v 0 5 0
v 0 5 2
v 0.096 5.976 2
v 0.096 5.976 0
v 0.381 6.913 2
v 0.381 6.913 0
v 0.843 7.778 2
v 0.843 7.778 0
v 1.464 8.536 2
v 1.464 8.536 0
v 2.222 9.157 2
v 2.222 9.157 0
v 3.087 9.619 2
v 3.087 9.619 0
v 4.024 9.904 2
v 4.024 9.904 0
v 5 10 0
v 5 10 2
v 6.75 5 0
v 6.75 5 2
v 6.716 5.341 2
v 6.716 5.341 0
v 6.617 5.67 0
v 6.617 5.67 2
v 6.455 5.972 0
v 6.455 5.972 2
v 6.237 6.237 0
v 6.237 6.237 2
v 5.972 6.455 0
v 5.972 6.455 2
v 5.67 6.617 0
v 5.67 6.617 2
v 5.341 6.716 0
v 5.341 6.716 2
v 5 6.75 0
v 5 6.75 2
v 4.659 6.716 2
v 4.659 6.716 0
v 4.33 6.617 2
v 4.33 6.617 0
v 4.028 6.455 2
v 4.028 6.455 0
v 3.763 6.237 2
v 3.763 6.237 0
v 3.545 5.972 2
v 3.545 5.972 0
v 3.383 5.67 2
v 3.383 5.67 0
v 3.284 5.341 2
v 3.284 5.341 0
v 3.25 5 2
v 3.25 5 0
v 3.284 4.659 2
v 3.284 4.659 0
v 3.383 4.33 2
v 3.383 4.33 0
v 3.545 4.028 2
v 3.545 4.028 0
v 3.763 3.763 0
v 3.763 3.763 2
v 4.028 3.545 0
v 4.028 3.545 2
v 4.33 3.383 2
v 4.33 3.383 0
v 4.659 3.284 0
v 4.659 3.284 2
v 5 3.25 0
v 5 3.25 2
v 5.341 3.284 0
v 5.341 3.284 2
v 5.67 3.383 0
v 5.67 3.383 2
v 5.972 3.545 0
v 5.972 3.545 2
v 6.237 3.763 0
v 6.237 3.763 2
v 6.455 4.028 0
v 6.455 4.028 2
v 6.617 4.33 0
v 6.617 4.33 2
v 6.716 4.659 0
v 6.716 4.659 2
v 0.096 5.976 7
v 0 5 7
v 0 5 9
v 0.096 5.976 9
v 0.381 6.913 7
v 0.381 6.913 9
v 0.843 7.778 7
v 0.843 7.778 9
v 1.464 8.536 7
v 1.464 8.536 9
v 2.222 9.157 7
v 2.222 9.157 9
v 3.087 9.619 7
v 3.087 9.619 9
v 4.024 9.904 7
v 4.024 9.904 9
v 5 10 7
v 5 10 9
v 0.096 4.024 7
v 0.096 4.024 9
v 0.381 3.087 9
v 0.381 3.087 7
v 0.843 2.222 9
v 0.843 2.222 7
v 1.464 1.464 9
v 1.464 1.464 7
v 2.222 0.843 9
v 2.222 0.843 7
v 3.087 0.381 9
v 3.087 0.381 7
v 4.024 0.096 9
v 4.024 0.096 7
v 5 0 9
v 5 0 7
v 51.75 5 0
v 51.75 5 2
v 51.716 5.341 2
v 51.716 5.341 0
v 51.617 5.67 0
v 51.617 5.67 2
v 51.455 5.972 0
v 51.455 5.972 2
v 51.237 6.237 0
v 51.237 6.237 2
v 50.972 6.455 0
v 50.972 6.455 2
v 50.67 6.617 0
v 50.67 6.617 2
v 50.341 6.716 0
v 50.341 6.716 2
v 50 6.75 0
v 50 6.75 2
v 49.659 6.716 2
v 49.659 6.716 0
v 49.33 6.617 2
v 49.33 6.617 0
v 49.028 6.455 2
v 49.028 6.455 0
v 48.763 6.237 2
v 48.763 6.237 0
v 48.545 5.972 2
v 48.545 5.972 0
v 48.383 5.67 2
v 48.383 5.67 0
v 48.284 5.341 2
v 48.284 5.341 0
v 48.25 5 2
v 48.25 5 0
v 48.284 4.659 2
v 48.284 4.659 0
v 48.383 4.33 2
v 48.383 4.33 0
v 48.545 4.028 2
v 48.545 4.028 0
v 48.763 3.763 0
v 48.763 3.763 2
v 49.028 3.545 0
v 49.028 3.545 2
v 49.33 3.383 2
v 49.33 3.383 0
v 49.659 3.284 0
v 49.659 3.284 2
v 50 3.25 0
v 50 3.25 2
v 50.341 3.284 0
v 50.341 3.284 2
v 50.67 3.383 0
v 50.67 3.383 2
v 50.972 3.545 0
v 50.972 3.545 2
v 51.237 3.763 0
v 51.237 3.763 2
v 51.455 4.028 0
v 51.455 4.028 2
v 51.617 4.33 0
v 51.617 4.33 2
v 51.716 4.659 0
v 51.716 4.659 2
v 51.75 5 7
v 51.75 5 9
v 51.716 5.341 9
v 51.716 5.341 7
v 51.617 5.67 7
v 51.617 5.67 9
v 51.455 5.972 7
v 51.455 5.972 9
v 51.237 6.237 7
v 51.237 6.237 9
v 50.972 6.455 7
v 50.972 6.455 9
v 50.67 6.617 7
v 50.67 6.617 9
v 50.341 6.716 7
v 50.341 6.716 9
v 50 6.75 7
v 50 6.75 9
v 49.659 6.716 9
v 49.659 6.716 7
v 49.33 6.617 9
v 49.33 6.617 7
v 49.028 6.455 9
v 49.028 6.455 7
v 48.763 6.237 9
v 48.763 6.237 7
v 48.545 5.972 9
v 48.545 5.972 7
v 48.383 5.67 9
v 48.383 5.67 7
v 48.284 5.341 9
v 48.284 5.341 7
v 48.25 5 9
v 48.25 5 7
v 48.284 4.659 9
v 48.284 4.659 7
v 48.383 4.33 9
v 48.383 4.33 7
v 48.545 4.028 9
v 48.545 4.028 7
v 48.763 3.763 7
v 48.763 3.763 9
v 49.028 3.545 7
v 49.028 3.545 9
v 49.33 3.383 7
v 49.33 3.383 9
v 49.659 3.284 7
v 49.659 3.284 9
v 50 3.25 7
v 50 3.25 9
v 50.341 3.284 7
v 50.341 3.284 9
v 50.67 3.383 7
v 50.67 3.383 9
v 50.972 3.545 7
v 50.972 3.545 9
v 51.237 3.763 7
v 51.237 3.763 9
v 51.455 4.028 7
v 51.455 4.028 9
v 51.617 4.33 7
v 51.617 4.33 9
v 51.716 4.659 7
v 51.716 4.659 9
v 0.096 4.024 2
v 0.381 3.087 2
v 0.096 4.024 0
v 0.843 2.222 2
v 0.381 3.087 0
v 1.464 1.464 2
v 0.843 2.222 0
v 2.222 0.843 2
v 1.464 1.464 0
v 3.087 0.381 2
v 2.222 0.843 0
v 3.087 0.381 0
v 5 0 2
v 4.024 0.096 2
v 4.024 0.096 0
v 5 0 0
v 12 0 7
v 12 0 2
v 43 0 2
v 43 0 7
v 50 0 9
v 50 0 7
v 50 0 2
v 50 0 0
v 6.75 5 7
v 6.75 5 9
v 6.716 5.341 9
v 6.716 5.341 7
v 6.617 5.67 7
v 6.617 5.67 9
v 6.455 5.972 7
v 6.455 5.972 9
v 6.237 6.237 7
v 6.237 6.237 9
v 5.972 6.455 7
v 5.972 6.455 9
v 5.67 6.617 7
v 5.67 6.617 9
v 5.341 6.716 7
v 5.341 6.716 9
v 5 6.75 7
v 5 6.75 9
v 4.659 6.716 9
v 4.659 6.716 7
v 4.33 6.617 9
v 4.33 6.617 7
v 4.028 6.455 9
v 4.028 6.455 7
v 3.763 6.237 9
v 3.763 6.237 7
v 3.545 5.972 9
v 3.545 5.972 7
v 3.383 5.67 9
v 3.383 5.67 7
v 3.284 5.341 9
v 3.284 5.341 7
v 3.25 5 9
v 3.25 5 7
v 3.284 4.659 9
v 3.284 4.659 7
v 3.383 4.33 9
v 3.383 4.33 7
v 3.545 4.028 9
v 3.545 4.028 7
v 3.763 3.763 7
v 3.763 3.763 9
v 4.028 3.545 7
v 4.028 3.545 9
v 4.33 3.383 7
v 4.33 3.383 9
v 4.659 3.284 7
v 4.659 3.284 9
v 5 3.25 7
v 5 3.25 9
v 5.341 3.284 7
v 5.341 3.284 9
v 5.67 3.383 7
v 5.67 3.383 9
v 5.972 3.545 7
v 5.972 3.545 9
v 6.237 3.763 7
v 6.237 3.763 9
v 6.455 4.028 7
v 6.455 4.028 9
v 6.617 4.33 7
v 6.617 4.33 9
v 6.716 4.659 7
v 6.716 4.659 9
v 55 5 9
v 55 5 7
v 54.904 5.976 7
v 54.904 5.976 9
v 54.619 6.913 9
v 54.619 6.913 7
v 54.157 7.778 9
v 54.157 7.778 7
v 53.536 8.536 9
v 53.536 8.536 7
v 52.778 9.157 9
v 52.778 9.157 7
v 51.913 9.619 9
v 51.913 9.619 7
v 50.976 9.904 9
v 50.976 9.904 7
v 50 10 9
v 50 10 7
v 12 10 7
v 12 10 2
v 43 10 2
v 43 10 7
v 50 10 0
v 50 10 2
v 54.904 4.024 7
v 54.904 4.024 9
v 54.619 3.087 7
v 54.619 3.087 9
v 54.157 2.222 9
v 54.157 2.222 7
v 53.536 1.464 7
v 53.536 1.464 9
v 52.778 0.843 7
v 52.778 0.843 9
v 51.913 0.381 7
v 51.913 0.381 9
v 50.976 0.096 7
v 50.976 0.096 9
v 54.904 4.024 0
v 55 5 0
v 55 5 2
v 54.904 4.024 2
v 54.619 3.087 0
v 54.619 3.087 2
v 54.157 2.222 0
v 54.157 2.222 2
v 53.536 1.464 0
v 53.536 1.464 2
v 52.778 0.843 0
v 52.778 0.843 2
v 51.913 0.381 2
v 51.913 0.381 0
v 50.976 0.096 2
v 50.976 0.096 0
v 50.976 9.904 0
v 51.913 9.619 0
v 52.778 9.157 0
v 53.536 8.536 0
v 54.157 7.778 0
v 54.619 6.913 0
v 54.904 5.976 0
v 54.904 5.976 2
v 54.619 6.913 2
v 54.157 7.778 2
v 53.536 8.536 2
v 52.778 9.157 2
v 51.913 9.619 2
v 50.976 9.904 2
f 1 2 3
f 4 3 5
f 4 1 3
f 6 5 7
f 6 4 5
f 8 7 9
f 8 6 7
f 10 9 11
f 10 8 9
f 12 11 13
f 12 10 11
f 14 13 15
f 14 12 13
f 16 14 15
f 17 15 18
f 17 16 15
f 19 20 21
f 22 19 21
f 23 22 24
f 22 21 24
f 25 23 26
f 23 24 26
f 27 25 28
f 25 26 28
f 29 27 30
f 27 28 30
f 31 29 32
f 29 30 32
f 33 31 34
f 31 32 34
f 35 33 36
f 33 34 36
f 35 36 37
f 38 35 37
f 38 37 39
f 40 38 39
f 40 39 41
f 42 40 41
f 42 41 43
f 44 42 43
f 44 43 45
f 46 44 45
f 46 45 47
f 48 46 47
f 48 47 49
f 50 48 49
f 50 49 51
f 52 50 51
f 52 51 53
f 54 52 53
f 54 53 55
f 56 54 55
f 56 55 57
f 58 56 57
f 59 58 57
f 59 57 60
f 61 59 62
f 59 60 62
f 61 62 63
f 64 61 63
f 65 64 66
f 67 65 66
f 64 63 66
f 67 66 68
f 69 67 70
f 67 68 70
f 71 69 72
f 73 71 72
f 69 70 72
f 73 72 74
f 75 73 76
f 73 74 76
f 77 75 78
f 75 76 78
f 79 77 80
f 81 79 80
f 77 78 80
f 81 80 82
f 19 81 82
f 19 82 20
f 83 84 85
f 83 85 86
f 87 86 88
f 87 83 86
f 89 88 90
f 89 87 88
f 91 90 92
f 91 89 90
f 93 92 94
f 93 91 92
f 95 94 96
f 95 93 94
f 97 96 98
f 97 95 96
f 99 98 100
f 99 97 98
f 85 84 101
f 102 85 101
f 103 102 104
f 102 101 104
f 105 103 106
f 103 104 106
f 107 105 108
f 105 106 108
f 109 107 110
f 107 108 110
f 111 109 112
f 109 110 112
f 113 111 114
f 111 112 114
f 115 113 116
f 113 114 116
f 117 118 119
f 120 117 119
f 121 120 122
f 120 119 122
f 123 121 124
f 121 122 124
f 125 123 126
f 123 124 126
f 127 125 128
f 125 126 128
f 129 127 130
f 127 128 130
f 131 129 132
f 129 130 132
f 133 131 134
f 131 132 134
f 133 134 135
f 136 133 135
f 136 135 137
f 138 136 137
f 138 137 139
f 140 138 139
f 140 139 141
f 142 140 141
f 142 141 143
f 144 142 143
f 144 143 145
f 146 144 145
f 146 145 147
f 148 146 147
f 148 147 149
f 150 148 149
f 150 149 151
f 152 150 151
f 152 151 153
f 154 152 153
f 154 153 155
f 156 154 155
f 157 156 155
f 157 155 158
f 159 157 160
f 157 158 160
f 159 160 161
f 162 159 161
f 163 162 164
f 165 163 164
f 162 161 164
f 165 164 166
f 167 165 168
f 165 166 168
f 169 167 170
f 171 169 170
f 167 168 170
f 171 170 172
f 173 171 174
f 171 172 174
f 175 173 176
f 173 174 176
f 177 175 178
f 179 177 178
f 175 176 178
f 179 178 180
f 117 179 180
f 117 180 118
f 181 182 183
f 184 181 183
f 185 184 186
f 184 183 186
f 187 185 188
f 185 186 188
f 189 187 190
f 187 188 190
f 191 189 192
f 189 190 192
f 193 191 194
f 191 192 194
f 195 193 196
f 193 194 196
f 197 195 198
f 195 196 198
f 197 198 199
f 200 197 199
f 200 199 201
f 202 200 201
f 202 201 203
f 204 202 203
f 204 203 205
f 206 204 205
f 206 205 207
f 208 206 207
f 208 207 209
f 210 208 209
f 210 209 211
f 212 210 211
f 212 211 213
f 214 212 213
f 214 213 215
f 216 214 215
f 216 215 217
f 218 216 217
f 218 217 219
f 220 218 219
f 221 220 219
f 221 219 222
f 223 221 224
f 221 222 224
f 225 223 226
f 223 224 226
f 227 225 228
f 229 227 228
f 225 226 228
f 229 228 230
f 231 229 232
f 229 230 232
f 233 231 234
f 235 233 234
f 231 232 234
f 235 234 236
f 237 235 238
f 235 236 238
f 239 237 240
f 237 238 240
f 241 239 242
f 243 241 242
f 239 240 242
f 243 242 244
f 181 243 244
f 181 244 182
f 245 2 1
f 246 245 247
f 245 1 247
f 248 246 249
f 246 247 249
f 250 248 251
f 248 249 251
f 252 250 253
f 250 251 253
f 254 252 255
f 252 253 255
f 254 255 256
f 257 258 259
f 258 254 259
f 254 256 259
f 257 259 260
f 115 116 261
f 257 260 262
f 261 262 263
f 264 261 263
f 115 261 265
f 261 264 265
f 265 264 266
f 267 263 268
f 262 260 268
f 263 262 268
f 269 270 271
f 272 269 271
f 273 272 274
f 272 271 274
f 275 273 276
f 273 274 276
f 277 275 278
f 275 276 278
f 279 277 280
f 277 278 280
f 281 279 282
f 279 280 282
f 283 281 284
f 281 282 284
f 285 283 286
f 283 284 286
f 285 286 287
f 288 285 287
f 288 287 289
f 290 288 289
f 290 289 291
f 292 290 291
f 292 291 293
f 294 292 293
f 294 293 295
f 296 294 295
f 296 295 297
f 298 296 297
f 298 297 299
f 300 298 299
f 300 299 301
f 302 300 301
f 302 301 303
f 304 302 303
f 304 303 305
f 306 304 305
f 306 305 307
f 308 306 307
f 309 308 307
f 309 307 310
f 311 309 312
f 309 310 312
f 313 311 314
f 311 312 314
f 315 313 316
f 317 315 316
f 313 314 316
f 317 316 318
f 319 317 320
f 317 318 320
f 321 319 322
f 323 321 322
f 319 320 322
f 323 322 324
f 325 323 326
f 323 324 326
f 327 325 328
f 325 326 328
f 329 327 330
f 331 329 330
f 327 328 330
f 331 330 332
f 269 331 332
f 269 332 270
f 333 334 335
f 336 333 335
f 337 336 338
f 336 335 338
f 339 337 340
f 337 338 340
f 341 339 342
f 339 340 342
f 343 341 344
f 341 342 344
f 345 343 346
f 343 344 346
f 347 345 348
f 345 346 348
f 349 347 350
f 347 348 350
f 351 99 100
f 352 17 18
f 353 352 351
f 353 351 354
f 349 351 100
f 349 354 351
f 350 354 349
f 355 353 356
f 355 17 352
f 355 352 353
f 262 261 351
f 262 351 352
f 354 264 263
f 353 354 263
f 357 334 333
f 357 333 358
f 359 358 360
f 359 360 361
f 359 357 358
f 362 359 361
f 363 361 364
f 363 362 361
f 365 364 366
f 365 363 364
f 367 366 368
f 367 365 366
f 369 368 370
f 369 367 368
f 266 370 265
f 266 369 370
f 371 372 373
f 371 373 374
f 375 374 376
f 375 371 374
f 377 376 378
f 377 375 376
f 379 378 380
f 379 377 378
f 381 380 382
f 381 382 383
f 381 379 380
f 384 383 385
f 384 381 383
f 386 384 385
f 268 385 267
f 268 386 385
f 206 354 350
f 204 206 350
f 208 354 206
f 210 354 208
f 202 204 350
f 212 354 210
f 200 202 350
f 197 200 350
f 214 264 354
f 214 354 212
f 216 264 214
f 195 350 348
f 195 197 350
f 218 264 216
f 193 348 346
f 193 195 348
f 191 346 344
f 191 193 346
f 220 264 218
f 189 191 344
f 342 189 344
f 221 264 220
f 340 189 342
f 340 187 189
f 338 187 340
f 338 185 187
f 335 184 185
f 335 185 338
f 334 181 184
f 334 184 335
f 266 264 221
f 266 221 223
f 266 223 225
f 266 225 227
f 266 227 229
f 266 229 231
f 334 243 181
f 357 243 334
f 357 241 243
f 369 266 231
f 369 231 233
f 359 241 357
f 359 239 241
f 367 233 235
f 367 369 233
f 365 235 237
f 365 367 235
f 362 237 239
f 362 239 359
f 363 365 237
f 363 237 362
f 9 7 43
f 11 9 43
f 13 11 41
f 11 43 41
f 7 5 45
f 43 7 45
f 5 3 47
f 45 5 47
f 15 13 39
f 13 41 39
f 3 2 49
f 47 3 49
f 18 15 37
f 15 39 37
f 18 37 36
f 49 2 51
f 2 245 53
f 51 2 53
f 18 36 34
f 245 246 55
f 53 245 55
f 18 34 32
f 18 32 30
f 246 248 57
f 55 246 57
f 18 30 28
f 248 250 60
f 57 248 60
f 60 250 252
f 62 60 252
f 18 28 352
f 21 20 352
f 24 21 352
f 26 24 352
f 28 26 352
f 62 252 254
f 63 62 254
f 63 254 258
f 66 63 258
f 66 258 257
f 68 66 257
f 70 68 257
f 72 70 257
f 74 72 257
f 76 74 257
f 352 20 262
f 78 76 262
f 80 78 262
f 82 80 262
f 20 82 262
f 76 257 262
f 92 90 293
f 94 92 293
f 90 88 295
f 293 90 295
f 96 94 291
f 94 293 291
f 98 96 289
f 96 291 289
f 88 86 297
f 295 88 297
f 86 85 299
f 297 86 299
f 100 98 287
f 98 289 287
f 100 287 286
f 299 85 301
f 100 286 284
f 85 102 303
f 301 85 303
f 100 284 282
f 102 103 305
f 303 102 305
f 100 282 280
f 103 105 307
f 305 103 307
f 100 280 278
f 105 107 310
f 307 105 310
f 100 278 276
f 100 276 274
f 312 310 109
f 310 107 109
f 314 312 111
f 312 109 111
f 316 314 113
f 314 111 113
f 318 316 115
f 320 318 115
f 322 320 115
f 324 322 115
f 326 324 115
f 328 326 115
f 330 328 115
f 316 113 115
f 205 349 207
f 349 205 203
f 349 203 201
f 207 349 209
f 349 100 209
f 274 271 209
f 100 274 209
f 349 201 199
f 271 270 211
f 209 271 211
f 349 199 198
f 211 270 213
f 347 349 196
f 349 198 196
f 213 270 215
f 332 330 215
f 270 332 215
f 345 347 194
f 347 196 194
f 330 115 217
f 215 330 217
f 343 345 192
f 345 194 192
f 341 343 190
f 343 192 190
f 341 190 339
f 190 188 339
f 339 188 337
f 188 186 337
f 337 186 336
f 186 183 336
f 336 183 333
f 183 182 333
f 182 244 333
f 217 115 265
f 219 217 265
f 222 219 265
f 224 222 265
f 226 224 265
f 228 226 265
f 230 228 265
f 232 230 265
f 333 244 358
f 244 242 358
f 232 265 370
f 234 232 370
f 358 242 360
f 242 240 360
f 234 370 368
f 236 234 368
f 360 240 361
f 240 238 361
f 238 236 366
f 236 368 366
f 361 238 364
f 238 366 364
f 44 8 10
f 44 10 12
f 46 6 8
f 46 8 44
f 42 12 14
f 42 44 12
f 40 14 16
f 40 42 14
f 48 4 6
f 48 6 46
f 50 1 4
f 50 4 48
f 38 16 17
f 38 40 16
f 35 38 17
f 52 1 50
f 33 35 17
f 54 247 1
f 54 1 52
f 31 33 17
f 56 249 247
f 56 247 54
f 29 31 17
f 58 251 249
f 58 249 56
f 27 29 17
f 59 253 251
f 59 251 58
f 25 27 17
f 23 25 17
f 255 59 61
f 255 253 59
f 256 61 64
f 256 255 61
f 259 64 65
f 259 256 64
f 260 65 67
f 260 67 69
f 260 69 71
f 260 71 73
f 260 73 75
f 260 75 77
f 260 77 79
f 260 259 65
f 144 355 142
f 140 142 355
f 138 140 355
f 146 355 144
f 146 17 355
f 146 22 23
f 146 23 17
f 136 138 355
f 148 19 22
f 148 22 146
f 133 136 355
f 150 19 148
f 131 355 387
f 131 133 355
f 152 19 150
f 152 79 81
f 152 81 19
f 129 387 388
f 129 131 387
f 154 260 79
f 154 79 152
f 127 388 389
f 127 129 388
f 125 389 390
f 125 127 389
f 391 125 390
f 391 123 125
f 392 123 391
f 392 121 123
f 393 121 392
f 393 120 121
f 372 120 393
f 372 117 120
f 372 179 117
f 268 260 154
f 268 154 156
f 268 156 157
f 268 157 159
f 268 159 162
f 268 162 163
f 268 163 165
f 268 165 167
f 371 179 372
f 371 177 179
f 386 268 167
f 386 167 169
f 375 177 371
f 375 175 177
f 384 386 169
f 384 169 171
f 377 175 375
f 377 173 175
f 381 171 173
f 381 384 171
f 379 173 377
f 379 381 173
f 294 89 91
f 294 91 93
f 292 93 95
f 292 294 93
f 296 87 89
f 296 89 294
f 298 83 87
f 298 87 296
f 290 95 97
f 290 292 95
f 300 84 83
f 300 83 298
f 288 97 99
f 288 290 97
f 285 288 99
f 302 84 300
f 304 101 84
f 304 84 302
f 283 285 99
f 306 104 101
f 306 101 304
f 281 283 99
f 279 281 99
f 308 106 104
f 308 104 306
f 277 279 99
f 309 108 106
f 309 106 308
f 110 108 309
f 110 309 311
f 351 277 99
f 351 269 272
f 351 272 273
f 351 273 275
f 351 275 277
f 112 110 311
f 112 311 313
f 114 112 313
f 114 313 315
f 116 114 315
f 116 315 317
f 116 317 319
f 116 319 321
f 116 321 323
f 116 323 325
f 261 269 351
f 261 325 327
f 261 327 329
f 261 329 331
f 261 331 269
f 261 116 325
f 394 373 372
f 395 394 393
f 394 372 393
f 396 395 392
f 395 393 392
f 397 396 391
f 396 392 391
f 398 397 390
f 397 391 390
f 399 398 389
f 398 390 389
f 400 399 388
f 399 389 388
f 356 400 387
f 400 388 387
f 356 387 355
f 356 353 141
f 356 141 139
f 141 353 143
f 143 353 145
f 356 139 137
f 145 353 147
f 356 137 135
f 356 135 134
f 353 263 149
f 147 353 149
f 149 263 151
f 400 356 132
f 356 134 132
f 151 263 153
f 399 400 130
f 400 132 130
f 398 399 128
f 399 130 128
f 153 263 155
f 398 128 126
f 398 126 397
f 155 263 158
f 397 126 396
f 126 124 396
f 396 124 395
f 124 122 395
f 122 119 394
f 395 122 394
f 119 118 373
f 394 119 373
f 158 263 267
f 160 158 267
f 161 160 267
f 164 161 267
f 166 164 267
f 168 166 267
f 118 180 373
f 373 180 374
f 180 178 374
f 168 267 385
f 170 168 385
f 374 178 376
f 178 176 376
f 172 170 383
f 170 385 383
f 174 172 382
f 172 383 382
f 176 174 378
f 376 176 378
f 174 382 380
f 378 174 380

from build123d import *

# Parameters (mm, degrees)
SKETCH_5_W               = 55
SKETCH_5_H               = 9
EXTRUDE_1_DEPTH          = 10
FILLET_2_R               = 5
CUT_EXTRUDE_1_REACH      = 58.622
SKETCH_6_R               = 1.75
CUT_EXTRUDE_4_DEPTH      = 57.621550668
CUT_EXTRUDE_4_DEPTH_BACK = 57.621550668
SKETCH_7_W               = 12
SKETCH_7_H               = 5


with BuildPart() as part:
    # 草图5 → 凸台-拉伸1 (new body)
    with BuildSketch(Plane(origin=(0, 0, 0), x_dir=(1, 0, 0), z_dir=(0, 1, 0))):
        with Locations((27.5, -4.5)):
            Rectangle(SKETCH_5_W, SKETCH_5_H)
    extrude(amount=EXTRUDE_1_DEPTH)

    # 圆角2
    fillet_2_edges = [part.edges().sort_by_distance(p)[0] for p in [
        (55, 0, 4.5),
        (55, 10, 4.5),
        (0, 0, 4.5),
        (0, 10, 4.5),
    ]]
    fillet(fillet_2_edges, radius=FILLET_2_R - 0.0001)  # a hair under: the kernel refuses the full size

    # 草图6 → 切除-拉伸1 (cut, up to next)
    with BuildSketch(Plane.XY.offset(9), mode=Mode.PRIVATE) as cut_extrude_1_sk1:
        with Locations((5, 5)):
            Circle(SKETCH_6_R)
    cut_extrude_1_tool1 = extrude(cut_extrude_1_sk1.sketch, amount=-CUT_EXTRUDE_1_REACH, mode=Mode.PRIVATE) & part.part
    # 草图6 → 切除-拉伸1 (cut, up to next)
    with BuildSketch(Plane.XY.offset(9), mode=Mode.PRIVATE) as cut_extrude_1_sk2:
        with Locations((50, 5)):
            Circle(SKETCH_6_R)
    cut_extrude_1_tool2 = extrude(cut_extrude_1_sk2.sketch, amount=-CUT_EXTRUDE_1_REACH, mode=Mode.PRIVATE) & part.part
    add(cut_extrude_1_tool1.solids().sort_by_distance((5, 5, 9))[0], mode=Mode.SUBTRACT)
    add(cut_extrude_1_tool2.solids().sort_by_distance((50, 5, 9))[0], mode=Mode.SUBTRACT)

    # 草图7 → 切除-拉伸4 (cut, two sides: drawn at the far end of the back side and taken through both)
    with BuildSketch(Plane(origin=(0, 0, 0), x_dir=(1, 0, 0), z_dir=(0, 1, 0)).offset(-CUT_EXTRUDE_4_DEPTH_BACK)):
        with Locations((6, -4.5)):
            Rectangle(SKETCH_7_W, SKETCH_7_H)
        with Locations((49, -4.5)):
            Rectangle(SKETCH_7_W, SKETCH_7_H)
    extrude(amount=CUT_EXTRUDE_4_DEPTH + CUT_EXTRUDE_4_DEPTH_BACK, mode=Mode.SUBTRACT)


solid = part.part
